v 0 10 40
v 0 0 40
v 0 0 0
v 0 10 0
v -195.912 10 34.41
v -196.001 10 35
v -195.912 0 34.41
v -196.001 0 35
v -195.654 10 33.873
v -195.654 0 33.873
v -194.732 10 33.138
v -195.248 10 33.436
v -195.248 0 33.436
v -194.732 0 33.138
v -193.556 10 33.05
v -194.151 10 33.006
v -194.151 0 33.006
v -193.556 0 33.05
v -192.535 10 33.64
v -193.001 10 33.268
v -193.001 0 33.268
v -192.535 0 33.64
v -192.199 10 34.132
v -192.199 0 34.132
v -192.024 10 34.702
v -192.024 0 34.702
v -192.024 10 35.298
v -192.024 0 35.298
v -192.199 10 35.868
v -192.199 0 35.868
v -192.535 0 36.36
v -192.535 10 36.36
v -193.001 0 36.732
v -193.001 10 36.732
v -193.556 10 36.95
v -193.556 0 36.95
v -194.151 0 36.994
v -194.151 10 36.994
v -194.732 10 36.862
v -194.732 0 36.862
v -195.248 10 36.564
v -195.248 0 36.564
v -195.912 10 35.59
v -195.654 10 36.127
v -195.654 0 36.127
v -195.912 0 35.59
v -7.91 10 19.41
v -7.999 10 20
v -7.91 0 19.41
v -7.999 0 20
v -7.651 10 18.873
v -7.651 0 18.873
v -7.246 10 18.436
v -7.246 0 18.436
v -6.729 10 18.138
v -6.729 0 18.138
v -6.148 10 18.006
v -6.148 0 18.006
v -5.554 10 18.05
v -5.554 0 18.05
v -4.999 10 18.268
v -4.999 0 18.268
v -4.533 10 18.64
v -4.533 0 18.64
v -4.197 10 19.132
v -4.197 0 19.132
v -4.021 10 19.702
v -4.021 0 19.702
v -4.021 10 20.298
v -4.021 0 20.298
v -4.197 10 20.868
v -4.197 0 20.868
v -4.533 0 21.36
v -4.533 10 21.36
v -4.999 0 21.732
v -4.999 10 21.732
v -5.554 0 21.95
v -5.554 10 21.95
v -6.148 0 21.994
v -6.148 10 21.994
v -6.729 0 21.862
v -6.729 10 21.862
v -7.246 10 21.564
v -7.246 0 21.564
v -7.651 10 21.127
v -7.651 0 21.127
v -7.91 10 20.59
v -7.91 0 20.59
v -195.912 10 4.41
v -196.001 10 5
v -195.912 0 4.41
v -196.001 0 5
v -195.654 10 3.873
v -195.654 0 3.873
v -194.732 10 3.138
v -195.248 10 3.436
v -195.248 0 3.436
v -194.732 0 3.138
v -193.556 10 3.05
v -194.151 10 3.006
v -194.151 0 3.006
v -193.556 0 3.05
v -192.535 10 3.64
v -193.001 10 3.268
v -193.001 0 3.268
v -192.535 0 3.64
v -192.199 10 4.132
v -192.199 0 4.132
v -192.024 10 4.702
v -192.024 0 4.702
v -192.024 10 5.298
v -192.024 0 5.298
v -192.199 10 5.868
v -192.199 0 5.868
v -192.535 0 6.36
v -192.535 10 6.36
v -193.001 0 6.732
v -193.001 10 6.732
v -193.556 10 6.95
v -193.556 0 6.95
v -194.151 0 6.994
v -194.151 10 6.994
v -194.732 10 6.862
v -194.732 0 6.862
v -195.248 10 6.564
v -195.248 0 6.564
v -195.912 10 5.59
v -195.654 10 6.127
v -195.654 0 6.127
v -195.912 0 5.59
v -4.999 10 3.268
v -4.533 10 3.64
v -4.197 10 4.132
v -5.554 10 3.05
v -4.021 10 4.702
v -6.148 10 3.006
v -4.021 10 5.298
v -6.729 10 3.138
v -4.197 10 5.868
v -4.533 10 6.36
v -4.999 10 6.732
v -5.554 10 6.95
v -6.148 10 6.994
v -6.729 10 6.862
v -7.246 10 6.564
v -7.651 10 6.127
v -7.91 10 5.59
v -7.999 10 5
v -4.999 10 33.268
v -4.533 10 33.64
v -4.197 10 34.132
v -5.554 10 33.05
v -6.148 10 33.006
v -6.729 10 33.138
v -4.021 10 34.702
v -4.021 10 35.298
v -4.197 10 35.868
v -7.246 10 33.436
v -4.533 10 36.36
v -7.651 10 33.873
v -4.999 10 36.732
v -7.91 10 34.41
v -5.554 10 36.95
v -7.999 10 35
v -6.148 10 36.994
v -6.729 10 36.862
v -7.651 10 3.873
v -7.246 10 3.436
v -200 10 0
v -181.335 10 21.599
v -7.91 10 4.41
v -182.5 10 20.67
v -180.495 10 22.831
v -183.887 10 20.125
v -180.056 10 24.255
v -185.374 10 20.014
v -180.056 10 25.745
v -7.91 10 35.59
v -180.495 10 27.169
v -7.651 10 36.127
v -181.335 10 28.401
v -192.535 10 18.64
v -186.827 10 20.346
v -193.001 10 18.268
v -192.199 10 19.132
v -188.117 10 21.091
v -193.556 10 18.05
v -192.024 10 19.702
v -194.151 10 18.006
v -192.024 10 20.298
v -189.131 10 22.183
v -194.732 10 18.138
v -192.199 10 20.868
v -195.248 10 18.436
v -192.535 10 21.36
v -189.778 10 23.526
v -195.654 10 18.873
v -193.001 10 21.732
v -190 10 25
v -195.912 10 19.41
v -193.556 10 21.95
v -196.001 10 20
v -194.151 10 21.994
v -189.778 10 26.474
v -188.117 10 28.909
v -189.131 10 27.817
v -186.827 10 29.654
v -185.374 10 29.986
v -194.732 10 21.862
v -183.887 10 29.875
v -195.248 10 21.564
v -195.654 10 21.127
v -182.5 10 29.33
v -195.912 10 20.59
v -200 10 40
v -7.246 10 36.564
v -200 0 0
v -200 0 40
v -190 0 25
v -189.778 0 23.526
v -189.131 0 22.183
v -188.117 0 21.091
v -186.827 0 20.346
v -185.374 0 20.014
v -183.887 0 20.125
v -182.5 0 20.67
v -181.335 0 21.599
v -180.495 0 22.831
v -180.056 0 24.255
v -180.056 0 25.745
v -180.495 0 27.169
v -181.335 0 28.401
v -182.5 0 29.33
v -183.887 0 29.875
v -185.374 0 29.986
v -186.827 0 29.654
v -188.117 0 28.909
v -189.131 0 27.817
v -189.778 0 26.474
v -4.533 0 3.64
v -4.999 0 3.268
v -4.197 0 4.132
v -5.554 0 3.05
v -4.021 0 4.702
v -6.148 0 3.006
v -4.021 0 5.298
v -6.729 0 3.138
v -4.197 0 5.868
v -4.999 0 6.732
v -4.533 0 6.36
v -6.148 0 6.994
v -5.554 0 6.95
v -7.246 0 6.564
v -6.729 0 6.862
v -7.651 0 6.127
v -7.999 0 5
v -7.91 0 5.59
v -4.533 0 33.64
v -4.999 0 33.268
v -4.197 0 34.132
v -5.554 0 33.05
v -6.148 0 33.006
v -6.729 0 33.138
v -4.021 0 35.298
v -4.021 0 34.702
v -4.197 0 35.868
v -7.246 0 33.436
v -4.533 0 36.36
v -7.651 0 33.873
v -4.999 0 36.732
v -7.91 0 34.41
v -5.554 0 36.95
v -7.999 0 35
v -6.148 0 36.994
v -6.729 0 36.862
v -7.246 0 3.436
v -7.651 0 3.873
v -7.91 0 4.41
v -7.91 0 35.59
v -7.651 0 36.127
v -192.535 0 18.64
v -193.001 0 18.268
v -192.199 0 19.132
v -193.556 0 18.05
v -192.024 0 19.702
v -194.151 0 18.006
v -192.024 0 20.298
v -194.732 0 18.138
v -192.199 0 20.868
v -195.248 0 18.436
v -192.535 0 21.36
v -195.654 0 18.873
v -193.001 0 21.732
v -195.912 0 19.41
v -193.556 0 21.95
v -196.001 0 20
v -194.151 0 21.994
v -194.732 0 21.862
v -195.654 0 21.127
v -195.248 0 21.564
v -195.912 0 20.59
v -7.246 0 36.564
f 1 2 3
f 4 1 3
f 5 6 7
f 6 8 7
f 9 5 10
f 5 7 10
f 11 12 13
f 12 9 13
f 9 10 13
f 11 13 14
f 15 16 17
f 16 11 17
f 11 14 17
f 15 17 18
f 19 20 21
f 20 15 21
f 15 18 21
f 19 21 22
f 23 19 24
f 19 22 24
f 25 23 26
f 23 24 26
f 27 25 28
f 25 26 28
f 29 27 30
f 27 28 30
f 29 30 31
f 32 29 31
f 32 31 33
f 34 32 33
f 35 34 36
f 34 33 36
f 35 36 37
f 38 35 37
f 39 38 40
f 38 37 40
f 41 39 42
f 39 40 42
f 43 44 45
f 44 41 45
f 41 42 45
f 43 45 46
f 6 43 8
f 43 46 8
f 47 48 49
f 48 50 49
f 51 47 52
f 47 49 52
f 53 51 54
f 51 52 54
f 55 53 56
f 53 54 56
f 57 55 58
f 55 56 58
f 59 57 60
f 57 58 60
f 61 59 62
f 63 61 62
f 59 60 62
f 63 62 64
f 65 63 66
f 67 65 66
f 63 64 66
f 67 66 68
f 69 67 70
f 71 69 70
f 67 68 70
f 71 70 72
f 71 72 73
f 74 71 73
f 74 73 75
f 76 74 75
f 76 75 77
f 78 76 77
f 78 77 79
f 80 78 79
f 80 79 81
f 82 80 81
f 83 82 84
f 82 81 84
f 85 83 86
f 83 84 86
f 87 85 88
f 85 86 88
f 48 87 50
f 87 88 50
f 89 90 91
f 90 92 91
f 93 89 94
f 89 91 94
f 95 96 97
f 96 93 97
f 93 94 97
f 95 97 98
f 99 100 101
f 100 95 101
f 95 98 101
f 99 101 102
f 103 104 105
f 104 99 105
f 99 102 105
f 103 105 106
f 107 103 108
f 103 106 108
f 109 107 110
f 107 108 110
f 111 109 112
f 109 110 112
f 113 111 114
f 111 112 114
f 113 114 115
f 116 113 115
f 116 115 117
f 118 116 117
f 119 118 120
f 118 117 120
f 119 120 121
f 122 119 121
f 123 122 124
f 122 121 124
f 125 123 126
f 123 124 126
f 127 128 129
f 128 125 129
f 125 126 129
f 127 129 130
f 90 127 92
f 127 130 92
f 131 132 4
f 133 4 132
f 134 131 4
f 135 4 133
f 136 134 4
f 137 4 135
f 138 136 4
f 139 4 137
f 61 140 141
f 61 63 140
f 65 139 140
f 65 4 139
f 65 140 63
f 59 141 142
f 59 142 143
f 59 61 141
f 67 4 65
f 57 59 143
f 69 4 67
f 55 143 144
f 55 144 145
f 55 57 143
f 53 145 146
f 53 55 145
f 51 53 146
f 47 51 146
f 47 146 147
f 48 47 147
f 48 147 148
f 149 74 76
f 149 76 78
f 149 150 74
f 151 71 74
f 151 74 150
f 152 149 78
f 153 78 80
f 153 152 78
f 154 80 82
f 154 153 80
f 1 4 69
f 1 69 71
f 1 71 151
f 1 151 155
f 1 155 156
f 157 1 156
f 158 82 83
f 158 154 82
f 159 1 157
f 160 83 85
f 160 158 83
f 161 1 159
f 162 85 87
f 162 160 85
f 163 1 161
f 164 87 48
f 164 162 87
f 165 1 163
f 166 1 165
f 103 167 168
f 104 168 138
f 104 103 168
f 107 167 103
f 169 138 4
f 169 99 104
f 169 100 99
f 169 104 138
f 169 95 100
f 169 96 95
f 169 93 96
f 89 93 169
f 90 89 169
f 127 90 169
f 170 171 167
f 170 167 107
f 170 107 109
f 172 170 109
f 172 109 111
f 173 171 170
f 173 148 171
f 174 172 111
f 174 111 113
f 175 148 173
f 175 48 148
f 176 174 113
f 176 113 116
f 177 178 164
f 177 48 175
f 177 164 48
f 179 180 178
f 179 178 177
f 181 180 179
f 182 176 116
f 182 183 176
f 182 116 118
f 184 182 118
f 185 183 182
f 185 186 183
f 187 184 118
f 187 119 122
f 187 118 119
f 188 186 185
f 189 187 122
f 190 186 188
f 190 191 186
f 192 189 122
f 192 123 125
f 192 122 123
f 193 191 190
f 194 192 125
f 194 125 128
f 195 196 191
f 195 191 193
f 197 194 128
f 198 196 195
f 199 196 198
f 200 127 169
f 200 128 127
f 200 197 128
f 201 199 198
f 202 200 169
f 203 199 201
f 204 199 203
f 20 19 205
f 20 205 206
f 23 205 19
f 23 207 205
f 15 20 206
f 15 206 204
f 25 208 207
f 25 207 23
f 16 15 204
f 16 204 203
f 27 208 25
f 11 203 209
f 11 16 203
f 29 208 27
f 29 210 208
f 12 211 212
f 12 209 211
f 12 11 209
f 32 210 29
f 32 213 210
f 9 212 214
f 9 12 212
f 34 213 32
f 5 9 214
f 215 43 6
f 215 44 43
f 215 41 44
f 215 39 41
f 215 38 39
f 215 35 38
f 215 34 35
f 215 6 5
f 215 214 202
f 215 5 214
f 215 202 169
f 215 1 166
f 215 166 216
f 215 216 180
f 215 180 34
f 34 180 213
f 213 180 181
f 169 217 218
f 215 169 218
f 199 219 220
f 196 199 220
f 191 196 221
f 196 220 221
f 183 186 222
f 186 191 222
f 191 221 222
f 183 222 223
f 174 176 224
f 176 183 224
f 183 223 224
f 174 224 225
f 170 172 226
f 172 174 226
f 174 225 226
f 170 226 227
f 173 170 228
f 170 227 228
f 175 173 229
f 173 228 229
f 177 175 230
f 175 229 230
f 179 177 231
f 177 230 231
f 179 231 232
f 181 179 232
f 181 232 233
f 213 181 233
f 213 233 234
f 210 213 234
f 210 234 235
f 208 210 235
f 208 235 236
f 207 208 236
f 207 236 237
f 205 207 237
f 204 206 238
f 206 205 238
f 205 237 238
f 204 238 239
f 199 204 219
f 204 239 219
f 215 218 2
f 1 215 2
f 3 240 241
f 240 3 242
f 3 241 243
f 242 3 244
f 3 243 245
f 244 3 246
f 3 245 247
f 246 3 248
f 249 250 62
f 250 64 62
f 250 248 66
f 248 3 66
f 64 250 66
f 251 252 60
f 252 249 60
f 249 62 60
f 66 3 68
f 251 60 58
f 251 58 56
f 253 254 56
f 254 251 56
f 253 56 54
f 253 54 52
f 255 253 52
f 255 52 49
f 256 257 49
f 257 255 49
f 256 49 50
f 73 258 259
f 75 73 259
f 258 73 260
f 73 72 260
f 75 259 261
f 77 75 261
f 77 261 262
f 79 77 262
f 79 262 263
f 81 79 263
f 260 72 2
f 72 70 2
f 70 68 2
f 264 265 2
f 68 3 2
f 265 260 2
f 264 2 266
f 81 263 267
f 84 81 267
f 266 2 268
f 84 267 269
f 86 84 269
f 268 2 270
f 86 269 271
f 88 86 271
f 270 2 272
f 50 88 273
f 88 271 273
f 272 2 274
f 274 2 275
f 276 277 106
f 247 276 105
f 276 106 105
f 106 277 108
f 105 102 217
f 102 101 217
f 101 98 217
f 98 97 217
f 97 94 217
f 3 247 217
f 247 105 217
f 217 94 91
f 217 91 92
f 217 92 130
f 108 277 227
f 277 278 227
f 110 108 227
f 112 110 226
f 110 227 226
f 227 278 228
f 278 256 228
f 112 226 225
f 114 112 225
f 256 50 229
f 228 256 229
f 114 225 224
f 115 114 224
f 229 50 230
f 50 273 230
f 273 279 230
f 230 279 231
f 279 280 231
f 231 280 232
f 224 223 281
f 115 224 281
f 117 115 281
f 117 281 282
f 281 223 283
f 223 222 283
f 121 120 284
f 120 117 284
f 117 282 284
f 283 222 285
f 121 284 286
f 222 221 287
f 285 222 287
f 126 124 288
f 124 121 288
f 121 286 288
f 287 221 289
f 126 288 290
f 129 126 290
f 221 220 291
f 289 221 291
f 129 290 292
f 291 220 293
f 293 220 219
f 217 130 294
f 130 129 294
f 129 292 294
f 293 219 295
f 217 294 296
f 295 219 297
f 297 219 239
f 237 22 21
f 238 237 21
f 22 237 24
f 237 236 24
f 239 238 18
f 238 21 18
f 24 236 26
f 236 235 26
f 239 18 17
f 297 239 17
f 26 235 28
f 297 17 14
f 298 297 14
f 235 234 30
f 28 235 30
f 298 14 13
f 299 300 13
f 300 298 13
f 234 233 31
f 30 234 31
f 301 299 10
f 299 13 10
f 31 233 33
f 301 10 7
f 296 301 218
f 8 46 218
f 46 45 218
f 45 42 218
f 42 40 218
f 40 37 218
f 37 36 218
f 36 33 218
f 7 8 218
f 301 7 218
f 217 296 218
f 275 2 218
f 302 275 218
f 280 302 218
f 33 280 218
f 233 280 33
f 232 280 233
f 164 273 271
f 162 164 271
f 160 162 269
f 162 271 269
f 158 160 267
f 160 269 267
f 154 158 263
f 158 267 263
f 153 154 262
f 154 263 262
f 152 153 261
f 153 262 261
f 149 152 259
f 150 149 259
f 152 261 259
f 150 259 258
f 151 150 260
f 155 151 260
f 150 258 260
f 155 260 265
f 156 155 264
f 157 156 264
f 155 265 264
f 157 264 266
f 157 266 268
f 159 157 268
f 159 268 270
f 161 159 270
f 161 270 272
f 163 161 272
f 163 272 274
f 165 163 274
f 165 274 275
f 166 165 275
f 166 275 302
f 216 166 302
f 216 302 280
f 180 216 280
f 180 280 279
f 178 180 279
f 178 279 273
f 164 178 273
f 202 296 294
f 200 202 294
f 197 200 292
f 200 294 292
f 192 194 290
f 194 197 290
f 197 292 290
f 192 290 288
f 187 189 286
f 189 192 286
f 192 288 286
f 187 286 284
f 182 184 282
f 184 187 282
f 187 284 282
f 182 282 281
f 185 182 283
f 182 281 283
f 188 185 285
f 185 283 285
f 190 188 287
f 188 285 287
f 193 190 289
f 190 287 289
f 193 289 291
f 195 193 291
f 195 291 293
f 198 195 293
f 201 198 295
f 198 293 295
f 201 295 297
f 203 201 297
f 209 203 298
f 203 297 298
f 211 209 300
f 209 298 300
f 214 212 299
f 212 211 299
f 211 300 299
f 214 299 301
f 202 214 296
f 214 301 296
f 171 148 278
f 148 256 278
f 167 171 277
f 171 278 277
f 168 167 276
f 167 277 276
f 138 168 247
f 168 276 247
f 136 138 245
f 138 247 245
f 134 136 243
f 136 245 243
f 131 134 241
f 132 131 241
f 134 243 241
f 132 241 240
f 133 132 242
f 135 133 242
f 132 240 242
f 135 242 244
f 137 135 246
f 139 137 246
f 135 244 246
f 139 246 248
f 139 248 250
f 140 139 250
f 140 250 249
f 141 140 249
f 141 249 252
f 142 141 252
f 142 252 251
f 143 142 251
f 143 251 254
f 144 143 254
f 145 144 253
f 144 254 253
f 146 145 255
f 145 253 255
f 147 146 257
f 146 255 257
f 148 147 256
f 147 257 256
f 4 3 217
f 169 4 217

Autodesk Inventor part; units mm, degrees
ref_plane "YZ Plane" through (0, 0, 0) normal (1, 0, 0) x (0, 1, 0)
ref_plane "XZ Plane" through (0, 0, 0) normal (0, 1, 0) x (-1, 0, 0)
ref_plane "XY Plane" through (0, 0, 0) normal (0, 0, 1) x (1, 0, 0)
sketch "Block1" plane through (0, 0, 0) normal (0, 0, 1) x (1, 0, 0)
  line L0 (0.22, -40.22) -> (-200.22, -40.22)
  line L1 (-200.22, -40.22) -> (-200.22, 0.22)
  line L2 (-200.22, 0.22) -> (0.22, 0.22)
  line L3 (0.22, 0.22) -> (0.22, -40.22)
  circle A0 centre (-5.9987, -35) radius 2.22
  circle A1 centre (-5.9987, -20) radius 2.22
  circle A2 centre (-5.9987, -5) radius 2.22
  circle A3 centre (-185, -25) radius 5.22
  circle A4 centre (-194.0013, -35) radius 2.22
  circle A5 centre (-194.0013, -5) radius 2.22
  circle A6 centre (-194.0013, -20) radius 2.22
  point P0 (-106.5385, -20.3846)
sketch "Sketch1" plane through (0, 0, 0) normal (0, 1, 0) x (-1, 0, 0)
  line L0 (0, 0) -> (200, 0)
  line L1 (200, 0) -> (200, 40)
  line L2 (200, 40) -> (0, 40)
  line L3 (0, 40) -> (0, 0)
  circle A0 centre (5.9987, 5) radius 2
  line L4 (5.9987, -4.5949) -> (5.9987, 47.4768)
  circle A1 centre (5.9987, 35) radius 2
  circle A2 centre (5.9987, 20) radius 2
  line L5 (100, 57.9252) -> (100, -15.7167)
  circle A3 centre (194.0013, 5) radius 2
  circle A4 centre (194.0013, 35) radius 2
  circle A5 centre (194.0013, 20) radius 2
  circle A6 centre (185, 25) radius 5
  dimension "d0" = 200
  dimension "d1" = 40
  dimension "d4" = 4
  dimension "d5" = 4
  dimension "d6" = 5
  dimension "d7" = 5
  dimension "d8" = 4
  dimension "d9" = 20
  dimension "d10" = 100
  dimension "d13" = 10
  dimension "d14" = 15
  dimension "d15" = 15
extrude "Extrusion3" add sketch "Sketch1" along normal blind 10 contours L3 L2 L4 A1 A2 A0 L0 | L4 A0 A2 A1 L2 L5 L0 | L5 L2 L1 L0
sketch "Sketch2" plane through (0, 10, 0) normal (0, 1, 0) x (1, 0, 0)
  circle A0 centre (-185, -25) radius 5 projected
  circle A1 centre (-194.0013, -20) radius 2 projected
  circle A2 centre (-194.0013, -35) radius 2 projected
  circle A3 centre (-194.0013, -5) radius 2 projected
  circle A4 centre (-5.9987, -20) radius 2 projected
  circle A5 centre (-5.9987, -35) radius 2 projected
  circle A6 centre (-5.9987, -5) radius 2 projected
  line L0 (0, 0) -> (-200, 0) projected
  line L1 (-200, 0) -> (-200, -40) projected
  line L2 (-200, -40) -> (0, -40) projected
  line L3 (0, -40) -> (0, 0) projected
sketch "DXF" plane through (0, 0, 0) normal (0, 1, 0) x (-1, 0, 0)
  point P0 (0, 0)
properties part number "gripsupport"
